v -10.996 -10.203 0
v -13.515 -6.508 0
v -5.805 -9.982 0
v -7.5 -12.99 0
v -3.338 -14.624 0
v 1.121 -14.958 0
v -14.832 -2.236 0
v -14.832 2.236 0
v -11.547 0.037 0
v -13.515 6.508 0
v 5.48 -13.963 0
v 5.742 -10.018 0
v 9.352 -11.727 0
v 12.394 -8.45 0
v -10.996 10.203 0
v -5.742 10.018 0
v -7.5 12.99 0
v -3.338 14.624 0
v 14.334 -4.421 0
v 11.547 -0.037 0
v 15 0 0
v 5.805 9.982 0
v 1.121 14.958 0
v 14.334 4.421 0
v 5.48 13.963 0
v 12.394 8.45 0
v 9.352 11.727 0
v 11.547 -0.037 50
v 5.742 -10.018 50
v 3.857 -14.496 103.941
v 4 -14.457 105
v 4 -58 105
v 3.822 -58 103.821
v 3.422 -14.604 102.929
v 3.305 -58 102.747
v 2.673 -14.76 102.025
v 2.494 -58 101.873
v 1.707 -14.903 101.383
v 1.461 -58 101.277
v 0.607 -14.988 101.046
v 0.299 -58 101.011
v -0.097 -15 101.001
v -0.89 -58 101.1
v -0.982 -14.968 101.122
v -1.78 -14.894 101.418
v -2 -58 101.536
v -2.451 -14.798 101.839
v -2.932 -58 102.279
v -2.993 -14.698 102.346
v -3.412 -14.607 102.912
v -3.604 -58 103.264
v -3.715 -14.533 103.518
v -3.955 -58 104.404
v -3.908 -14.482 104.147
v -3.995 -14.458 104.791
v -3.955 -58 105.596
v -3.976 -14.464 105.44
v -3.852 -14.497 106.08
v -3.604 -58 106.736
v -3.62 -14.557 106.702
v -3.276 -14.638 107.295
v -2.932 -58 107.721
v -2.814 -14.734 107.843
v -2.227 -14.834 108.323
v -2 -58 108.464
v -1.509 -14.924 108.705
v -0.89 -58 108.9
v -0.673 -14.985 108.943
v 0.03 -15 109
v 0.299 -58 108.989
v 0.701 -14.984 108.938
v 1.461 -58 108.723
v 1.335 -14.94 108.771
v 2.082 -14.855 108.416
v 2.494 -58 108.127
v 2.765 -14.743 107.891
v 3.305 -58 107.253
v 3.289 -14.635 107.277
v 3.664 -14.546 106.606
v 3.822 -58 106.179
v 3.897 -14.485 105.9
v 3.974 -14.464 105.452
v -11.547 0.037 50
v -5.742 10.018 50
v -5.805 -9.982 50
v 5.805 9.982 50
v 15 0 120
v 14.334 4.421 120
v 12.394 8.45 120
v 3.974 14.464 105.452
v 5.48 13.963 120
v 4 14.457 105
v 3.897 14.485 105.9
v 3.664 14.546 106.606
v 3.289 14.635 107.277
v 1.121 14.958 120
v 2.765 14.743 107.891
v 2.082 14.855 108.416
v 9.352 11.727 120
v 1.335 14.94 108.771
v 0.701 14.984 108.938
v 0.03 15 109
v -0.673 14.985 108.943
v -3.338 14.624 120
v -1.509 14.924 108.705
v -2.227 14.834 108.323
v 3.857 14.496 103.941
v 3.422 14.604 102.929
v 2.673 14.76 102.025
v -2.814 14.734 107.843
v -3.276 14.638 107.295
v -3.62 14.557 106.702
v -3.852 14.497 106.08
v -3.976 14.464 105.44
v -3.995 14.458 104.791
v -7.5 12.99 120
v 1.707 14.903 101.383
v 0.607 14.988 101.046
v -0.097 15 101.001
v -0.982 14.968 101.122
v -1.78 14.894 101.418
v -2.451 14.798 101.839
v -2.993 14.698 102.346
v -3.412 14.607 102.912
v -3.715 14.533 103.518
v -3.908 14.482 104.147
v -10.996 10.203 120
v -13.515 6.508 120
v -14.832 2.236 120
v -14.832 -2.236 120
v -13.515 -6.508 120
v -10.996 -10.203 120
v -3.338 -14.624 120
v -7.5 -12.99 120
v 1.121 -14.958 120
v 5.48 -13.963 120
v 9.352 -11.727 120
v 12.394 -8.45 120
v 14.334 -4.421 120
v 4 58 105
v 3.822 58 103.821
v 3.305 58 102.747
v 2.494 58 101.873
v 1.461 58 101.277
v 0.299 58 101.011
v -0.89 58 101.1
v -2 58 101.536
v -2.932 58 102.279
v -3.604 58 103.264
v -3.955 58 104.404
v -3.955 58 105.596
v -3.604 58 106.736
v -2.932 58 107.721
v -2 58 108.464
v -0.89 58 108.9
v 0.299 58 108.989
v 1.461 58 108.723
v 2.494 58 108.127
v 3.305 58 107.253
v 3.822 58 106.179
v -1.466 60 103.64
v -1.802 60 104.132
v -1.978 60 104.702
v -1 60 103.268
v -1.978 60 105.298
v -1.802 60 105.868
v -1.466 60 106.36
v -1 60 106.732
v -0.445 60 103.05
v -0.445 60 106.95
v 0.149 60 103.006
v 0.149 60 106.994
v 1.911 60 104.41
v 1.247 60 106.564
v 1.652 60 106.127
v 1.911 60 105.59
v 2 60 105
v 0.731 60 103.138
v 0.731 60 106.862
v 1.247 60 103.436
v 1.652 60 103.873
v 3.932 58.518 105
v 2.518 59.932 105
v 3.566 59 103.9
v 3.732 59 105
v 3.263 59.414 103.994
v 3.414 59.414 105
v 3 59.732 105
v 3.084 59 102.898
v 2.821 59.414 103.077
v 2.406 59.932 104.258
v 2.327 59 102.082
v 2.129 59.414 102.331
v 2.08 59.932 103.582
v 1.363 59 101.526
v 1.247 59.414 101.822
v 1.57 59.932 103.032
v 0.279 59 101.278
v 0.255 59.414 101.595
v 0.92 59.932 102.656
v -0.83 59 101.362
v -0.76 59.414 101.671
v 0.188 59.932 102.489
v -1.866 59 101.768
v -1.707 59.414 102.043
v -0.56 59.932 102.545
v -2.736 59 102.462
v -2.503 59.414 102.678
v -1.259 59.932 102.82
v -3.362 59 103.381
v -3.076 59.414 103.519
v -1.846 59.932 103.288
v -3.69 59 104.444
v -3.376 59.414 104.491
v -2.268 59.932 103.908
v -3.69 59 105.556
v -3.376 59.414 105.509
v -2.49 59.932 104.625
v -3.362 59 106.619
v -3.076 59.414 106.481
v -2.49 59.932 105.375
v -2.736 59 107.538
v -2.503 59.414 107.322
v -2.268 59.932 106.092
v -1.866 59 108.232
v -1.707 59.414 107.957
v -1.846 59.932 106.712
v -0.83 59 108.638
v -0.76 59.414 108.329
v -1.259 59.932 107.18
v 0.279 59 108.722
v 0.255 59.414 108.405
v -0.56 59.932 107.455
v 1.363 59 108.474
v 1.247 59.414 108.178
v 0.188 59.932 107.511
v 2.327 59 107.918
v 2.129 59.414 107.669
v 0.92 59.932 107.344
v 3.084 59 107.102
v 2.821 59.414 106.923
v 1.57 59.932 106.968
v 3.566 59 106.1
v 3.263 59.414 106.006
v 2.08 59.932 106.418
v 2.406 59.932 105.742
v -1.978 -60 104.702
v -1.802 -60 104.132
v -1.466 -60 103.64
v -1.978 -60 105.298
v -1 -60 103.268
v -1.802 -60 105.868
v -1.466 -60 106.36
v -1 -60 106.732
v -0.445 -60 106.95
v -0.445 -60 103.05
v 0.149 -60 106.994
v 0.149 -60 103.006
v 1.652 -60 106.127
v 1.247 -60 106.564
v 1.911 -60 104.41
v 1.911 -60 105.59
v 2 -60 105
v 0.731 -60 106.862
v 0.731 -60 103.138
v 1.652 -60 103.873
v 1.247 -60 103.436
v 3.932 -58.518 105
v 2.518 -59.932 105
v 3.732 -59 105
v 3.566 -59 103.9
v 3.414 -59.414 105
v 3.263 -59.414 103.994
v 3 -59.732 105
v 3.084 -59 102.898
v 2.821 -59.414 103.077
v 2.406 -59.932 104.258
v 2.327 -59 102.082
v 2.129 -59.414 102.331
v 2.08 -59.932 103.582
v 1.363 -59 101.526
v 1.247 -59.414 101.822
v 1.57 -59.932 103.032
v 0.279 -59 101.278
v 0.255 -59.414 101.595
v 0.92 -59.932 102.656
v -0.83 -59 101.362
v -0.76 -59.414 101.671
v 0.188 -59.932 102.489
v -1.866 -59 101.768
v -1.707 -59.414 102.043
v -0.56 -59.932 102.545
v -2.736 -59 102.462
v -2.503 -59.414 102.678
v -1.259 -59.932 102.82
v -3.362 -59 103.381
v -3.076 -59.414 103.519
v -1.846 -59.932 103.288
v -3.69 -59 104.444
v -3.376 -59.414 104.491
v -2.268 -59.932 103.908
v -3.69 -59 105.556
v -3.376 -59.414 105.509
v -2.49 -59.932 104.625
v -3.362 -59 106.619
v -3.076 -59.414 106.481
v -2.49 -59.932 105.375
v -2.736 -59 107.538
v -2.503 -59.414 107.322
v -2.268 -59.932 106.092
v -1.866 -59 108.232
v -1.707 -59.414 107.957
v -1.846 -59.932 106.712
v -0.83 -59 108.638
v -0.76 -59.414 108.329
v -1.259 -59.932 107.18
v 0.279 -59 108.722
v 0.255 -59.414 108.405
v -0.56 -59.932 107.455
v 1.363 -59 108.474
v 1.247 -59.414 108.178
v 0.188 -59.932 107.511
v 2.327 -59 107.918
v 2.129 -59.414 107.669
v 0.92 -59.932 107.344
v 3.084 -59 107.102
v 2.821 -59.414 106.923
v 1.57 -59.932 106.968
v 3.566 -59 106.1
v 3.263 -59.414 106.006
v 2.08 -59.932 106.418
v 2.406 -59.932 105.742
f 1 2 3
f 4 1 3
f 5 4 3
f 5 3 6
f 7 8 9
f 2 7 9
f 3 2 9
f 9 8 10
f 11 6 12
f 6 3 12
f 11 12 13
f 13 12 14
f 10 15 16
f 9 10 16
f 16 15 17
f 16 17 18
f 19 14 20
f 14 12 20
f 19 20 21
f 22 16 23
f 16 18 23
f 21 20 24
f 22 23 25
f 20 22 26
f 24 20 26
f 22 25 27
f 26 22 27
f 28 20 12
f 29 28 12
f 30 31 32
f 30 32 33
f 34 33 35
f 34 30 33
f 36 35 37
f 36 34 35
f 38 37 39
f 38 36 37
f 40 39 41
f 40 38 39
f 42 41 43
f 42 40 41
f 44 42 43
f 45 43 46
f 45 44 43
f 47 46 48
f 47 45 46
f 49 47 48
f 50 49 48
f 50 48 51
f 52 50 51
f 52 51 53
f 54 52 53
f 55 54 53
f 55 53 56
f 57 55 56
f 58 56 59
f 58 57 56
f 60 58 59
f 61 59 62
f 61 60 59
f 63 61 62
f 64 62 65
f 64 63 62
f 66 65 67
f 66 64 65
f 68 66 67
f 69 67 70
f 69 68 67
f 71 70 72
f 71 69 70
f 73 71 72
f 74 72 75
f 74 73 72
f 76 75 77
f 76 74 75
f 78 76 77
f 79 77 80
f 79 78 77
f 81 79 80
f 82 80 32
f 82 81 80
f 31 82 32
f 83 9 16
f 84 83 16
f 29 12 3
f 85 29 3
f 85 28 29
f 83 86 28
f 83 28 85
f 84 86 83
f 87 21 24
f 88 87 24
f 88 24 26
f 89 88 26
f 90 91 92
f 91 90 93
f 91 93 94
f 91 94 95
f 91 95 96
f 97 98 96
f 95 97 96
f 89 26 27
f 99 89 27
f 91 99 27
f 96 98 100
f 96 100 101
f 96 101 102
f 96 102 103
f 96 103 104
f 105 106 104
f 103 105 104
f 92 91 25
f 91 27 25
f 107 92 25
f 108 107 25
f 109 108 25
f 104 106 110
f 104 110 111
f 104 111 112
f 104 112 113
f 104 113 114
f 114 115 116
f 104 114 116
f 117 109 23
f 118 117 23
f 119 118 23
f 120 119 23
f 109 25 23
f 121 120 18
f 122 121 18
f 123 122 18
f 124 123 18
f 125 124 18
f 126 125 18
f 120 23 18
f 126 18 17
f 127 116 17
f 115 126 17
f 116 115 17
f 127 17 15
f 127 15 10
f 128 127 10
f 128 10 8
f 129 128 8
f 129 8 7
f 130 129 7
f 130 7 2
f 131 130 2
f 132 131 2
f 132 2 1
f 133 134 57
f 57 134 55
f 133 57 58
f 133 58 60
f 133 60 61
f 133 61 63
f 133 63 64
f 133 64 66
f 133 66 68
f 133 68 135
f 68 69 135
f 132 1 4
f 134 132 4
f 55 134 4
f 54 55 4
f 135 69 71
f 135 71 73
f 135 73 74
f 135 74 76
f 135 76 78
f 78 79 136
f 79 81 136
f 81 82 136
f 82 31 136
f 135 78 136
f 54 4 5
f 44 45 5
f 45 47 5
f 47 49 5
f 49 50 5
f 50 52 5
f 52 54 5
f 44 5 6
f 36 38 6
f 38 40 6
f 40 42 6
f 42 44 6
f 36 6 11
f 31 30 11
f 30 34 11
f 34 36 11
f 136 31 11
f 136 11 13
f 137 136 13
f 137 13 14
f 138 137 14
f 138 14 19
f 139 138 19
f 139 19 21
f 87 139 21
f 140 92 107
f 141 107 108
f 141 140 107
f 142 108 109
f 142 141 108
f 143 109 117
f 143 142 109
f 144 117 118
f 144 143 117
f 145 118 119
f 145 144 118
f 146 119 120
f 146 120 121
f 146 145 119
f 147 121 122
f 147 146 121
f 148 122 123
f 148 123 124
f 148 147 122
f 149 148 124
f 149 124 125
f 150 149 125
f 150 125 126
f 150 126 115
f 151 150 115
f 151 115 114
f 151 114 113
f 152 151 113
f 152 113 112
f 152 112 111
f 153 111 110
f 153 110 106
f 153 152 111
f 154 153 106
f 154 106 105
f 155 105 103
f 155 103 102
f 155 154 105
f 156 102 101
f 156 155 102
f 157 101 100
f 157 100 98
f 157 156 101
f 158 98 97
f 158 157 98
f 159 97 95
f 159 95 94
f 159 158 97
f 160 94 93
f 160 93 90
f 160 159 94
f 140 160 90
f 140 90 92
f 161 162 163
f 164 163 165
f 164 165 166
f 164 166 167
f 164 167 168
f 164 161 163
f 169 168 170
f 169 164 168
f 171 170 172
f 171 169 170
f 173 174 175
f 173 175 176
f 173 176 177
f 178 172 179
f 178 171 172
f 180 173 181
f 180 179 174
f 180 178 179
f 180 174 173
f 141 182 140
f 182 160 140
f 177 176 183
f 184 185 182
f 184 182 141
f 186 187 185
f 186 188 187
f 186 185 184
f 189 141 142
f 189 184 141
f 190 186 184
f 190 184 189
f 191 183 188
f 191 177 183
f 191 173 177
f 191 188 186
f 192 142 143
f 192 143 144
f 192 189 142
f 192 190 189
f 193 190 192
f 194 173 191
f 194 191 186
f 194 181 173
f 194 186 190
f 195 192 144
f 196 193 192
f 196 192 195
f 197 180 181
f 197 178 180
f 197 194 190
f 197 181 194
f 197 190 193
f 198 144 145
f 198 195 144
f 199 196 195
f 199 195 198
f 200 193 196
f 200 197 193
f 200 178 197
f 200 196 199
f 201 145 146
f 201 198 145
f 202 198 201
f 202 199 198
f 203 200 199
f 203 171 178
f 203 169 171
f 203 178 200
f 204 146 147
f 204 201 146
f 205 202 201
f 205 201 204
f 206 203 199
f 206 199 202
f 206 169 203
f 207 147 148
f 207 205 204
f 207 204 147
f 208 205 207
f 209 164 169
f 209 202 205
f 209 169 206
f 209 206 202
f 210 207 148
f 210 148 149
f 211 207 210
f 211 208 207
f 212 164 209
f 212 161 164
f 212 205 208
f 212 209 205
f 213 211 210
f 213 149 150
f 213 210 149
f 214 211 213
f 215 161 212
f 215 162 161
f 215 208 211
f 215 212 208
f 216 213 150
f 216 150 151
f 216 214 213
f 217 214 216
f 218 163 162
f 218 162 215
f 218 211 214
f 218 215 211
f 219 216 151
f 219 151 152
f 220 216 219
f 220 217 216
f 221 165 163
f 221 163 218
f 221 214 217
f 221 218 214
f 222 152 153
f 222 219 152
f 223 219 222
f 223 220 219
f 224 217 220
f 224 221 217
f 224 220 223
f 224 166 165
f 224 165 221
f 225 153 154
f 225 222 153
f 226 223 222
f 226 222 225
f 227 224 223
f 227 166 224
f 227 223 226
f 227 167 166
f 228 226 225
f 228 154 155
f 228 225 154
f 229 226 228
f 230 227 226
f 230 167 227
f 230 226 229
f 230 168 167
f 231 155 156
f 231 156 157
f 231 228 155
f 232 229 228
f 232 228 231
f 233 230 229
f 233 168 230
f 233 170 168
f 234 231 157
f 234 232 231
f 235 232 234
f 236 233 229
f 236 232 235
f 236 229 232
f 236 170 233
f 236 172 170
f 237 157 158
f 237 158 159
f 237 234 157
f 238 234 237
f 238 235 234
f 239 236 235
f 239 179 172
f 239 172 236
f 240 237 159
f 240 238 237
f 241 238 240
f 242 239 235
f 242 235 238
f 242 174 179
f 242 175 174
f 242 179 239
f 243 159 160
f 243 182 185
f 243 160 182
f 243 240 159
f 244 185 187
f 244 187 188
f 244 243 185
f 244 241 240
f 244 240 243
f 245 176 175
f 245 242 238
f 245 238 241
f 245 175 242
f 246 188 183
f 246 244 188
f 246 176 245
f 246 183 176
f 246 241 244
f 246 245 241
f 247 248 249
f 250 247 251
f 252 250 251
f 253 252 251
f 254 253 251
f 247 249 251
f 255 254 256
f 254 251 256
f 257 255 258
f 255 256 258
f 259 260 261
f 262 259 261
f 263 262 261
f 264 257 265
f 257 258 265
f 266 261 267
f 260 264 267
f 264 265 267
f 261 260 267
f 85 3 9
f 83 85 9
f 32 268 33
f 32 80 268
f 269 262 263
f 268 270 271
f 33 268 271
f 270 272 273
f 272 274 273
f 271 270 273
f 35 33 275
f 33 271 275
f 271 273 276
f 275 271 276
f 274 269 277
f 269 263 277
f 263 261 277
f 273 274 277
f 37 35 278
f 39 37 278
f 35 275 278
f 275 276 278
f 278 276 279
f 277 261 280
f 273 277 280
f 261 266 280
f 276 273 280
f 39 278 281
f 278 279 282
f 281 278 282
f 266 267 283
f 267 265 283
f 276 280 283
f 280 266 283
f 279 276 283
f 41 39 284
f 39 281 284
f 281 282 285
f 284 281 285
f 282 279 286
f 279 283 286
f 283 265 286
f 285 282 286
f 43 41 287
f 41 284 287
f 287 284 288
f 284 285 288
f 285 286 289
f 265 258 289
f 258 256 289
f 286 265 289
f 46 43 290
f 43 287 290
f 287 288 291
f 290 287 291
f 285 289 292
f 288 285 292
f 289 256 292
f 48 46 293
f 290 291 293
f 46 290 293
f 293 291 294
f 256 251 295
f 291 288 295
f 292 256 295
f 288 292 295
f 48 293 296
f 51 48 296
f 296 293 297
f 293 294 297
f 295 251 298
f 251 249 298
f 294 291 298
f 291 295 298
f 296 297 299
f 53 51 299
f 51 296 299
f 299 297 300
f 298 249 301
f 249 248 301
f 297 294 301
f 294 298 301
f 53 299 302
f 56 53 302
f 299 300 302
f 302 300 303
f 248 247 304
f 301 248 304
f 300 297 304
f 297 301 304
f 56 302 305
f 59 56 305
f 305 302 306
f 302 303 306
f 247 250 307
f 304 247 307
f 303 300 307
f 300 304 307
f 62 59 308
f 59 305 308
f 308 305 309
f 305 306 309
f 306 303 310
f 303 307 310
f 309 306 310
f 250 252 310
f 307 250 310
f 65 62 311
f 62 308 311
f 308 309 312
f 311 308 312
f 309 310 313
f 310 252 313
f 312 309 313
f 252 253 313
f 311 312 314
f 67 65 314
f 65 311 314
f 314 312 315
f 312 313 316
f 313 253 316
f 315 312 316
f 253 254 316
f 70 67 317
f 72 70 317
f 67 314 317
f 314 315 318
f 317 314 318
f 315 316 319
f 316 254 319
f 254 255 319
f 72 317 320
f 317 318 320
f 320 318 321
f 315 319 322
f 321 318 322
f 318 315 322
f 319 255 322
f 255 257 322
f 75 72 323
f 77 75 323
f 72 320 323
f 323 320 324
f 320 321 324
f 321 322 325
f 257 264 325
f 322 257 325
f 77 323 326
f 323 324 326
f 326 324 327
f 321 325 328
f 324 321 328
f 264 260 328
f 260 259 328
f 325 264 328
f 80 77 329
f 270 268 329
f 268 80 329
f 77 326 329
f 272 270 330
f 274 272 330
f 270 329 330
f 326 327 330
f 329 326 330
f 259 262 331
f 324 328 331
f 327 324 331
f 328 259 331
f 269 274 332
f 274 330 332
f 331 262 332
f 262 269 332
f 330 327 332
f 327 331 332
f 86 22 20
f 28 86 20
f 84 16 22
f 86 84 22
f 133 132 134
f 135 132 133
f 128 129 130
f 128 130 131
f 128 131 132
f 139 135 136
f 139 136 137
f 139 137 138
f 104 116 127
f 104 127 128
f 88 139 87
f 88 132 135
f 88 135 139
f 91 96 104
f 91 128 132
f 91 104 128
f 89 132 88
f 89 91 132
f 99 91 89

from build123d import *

# Parameters (mm, degrees)
CROQUIS2_R              = 15
SALIENTE_EXTRUIR1_DEPTH = 120
CORTAR_EXTRUIR1_DEPTH   = 50
CROQUIS4_R              = 4
SALIENTE_EXTRUIR2_DEPTH = 60
REDONDEO5_R             = 2


with BuildPart() as part:
    # Croquis2 → Saliente-Extruir1 (new body)
    with BuildSketch(Plane.XY):
        Circle(CROQUIS2_R)
    extrude(amount=SALIENTE_EXTRUIR1_DEPTH)

    # Croquis3 → Cortar-Extruir1 (cut)
    with BuildSketch(Plane(origin=(0, 0, 0), x_dir=(-1, 0, 0), z_dir=(0, 0, -1))):
        Polygon((5.741707523, 10.018289677), (-5.805239602, 9.981609414), (-11.546947124, -0.036680263), (-5.741707523, -10.018289677), (5.805239602, -9.981609414), (11.546947124, 0.036680263), align=None)
    extrude(amount=-CORTAR_EXTRUIR1_DEPTH, mode=Mode.SUBTRACT)

    # Croquis4 → Saliente-Extruir2 (add, symmetric)
    with BuildSketch(Plane(origin=(0, 0, 0), x_dir=(1, 0, 0), z_dir=(0, 1, 0))):
        with Locations((0, -105)):
            Circle(CROQUIS4_R)
    extrude(amount=SALIENTE_EXTRUIR2_DEPTH, both=True)

    # Redondeo5
    redondeo5_edges = [part.edges().sort_by_distance(p)[0] for p in [
        (-4, -60, 105),
        (-4, 60, 105),
    ]]
    fillet(redondeo5_edges, radius=REDONDEO5_R)


solid = part.part
